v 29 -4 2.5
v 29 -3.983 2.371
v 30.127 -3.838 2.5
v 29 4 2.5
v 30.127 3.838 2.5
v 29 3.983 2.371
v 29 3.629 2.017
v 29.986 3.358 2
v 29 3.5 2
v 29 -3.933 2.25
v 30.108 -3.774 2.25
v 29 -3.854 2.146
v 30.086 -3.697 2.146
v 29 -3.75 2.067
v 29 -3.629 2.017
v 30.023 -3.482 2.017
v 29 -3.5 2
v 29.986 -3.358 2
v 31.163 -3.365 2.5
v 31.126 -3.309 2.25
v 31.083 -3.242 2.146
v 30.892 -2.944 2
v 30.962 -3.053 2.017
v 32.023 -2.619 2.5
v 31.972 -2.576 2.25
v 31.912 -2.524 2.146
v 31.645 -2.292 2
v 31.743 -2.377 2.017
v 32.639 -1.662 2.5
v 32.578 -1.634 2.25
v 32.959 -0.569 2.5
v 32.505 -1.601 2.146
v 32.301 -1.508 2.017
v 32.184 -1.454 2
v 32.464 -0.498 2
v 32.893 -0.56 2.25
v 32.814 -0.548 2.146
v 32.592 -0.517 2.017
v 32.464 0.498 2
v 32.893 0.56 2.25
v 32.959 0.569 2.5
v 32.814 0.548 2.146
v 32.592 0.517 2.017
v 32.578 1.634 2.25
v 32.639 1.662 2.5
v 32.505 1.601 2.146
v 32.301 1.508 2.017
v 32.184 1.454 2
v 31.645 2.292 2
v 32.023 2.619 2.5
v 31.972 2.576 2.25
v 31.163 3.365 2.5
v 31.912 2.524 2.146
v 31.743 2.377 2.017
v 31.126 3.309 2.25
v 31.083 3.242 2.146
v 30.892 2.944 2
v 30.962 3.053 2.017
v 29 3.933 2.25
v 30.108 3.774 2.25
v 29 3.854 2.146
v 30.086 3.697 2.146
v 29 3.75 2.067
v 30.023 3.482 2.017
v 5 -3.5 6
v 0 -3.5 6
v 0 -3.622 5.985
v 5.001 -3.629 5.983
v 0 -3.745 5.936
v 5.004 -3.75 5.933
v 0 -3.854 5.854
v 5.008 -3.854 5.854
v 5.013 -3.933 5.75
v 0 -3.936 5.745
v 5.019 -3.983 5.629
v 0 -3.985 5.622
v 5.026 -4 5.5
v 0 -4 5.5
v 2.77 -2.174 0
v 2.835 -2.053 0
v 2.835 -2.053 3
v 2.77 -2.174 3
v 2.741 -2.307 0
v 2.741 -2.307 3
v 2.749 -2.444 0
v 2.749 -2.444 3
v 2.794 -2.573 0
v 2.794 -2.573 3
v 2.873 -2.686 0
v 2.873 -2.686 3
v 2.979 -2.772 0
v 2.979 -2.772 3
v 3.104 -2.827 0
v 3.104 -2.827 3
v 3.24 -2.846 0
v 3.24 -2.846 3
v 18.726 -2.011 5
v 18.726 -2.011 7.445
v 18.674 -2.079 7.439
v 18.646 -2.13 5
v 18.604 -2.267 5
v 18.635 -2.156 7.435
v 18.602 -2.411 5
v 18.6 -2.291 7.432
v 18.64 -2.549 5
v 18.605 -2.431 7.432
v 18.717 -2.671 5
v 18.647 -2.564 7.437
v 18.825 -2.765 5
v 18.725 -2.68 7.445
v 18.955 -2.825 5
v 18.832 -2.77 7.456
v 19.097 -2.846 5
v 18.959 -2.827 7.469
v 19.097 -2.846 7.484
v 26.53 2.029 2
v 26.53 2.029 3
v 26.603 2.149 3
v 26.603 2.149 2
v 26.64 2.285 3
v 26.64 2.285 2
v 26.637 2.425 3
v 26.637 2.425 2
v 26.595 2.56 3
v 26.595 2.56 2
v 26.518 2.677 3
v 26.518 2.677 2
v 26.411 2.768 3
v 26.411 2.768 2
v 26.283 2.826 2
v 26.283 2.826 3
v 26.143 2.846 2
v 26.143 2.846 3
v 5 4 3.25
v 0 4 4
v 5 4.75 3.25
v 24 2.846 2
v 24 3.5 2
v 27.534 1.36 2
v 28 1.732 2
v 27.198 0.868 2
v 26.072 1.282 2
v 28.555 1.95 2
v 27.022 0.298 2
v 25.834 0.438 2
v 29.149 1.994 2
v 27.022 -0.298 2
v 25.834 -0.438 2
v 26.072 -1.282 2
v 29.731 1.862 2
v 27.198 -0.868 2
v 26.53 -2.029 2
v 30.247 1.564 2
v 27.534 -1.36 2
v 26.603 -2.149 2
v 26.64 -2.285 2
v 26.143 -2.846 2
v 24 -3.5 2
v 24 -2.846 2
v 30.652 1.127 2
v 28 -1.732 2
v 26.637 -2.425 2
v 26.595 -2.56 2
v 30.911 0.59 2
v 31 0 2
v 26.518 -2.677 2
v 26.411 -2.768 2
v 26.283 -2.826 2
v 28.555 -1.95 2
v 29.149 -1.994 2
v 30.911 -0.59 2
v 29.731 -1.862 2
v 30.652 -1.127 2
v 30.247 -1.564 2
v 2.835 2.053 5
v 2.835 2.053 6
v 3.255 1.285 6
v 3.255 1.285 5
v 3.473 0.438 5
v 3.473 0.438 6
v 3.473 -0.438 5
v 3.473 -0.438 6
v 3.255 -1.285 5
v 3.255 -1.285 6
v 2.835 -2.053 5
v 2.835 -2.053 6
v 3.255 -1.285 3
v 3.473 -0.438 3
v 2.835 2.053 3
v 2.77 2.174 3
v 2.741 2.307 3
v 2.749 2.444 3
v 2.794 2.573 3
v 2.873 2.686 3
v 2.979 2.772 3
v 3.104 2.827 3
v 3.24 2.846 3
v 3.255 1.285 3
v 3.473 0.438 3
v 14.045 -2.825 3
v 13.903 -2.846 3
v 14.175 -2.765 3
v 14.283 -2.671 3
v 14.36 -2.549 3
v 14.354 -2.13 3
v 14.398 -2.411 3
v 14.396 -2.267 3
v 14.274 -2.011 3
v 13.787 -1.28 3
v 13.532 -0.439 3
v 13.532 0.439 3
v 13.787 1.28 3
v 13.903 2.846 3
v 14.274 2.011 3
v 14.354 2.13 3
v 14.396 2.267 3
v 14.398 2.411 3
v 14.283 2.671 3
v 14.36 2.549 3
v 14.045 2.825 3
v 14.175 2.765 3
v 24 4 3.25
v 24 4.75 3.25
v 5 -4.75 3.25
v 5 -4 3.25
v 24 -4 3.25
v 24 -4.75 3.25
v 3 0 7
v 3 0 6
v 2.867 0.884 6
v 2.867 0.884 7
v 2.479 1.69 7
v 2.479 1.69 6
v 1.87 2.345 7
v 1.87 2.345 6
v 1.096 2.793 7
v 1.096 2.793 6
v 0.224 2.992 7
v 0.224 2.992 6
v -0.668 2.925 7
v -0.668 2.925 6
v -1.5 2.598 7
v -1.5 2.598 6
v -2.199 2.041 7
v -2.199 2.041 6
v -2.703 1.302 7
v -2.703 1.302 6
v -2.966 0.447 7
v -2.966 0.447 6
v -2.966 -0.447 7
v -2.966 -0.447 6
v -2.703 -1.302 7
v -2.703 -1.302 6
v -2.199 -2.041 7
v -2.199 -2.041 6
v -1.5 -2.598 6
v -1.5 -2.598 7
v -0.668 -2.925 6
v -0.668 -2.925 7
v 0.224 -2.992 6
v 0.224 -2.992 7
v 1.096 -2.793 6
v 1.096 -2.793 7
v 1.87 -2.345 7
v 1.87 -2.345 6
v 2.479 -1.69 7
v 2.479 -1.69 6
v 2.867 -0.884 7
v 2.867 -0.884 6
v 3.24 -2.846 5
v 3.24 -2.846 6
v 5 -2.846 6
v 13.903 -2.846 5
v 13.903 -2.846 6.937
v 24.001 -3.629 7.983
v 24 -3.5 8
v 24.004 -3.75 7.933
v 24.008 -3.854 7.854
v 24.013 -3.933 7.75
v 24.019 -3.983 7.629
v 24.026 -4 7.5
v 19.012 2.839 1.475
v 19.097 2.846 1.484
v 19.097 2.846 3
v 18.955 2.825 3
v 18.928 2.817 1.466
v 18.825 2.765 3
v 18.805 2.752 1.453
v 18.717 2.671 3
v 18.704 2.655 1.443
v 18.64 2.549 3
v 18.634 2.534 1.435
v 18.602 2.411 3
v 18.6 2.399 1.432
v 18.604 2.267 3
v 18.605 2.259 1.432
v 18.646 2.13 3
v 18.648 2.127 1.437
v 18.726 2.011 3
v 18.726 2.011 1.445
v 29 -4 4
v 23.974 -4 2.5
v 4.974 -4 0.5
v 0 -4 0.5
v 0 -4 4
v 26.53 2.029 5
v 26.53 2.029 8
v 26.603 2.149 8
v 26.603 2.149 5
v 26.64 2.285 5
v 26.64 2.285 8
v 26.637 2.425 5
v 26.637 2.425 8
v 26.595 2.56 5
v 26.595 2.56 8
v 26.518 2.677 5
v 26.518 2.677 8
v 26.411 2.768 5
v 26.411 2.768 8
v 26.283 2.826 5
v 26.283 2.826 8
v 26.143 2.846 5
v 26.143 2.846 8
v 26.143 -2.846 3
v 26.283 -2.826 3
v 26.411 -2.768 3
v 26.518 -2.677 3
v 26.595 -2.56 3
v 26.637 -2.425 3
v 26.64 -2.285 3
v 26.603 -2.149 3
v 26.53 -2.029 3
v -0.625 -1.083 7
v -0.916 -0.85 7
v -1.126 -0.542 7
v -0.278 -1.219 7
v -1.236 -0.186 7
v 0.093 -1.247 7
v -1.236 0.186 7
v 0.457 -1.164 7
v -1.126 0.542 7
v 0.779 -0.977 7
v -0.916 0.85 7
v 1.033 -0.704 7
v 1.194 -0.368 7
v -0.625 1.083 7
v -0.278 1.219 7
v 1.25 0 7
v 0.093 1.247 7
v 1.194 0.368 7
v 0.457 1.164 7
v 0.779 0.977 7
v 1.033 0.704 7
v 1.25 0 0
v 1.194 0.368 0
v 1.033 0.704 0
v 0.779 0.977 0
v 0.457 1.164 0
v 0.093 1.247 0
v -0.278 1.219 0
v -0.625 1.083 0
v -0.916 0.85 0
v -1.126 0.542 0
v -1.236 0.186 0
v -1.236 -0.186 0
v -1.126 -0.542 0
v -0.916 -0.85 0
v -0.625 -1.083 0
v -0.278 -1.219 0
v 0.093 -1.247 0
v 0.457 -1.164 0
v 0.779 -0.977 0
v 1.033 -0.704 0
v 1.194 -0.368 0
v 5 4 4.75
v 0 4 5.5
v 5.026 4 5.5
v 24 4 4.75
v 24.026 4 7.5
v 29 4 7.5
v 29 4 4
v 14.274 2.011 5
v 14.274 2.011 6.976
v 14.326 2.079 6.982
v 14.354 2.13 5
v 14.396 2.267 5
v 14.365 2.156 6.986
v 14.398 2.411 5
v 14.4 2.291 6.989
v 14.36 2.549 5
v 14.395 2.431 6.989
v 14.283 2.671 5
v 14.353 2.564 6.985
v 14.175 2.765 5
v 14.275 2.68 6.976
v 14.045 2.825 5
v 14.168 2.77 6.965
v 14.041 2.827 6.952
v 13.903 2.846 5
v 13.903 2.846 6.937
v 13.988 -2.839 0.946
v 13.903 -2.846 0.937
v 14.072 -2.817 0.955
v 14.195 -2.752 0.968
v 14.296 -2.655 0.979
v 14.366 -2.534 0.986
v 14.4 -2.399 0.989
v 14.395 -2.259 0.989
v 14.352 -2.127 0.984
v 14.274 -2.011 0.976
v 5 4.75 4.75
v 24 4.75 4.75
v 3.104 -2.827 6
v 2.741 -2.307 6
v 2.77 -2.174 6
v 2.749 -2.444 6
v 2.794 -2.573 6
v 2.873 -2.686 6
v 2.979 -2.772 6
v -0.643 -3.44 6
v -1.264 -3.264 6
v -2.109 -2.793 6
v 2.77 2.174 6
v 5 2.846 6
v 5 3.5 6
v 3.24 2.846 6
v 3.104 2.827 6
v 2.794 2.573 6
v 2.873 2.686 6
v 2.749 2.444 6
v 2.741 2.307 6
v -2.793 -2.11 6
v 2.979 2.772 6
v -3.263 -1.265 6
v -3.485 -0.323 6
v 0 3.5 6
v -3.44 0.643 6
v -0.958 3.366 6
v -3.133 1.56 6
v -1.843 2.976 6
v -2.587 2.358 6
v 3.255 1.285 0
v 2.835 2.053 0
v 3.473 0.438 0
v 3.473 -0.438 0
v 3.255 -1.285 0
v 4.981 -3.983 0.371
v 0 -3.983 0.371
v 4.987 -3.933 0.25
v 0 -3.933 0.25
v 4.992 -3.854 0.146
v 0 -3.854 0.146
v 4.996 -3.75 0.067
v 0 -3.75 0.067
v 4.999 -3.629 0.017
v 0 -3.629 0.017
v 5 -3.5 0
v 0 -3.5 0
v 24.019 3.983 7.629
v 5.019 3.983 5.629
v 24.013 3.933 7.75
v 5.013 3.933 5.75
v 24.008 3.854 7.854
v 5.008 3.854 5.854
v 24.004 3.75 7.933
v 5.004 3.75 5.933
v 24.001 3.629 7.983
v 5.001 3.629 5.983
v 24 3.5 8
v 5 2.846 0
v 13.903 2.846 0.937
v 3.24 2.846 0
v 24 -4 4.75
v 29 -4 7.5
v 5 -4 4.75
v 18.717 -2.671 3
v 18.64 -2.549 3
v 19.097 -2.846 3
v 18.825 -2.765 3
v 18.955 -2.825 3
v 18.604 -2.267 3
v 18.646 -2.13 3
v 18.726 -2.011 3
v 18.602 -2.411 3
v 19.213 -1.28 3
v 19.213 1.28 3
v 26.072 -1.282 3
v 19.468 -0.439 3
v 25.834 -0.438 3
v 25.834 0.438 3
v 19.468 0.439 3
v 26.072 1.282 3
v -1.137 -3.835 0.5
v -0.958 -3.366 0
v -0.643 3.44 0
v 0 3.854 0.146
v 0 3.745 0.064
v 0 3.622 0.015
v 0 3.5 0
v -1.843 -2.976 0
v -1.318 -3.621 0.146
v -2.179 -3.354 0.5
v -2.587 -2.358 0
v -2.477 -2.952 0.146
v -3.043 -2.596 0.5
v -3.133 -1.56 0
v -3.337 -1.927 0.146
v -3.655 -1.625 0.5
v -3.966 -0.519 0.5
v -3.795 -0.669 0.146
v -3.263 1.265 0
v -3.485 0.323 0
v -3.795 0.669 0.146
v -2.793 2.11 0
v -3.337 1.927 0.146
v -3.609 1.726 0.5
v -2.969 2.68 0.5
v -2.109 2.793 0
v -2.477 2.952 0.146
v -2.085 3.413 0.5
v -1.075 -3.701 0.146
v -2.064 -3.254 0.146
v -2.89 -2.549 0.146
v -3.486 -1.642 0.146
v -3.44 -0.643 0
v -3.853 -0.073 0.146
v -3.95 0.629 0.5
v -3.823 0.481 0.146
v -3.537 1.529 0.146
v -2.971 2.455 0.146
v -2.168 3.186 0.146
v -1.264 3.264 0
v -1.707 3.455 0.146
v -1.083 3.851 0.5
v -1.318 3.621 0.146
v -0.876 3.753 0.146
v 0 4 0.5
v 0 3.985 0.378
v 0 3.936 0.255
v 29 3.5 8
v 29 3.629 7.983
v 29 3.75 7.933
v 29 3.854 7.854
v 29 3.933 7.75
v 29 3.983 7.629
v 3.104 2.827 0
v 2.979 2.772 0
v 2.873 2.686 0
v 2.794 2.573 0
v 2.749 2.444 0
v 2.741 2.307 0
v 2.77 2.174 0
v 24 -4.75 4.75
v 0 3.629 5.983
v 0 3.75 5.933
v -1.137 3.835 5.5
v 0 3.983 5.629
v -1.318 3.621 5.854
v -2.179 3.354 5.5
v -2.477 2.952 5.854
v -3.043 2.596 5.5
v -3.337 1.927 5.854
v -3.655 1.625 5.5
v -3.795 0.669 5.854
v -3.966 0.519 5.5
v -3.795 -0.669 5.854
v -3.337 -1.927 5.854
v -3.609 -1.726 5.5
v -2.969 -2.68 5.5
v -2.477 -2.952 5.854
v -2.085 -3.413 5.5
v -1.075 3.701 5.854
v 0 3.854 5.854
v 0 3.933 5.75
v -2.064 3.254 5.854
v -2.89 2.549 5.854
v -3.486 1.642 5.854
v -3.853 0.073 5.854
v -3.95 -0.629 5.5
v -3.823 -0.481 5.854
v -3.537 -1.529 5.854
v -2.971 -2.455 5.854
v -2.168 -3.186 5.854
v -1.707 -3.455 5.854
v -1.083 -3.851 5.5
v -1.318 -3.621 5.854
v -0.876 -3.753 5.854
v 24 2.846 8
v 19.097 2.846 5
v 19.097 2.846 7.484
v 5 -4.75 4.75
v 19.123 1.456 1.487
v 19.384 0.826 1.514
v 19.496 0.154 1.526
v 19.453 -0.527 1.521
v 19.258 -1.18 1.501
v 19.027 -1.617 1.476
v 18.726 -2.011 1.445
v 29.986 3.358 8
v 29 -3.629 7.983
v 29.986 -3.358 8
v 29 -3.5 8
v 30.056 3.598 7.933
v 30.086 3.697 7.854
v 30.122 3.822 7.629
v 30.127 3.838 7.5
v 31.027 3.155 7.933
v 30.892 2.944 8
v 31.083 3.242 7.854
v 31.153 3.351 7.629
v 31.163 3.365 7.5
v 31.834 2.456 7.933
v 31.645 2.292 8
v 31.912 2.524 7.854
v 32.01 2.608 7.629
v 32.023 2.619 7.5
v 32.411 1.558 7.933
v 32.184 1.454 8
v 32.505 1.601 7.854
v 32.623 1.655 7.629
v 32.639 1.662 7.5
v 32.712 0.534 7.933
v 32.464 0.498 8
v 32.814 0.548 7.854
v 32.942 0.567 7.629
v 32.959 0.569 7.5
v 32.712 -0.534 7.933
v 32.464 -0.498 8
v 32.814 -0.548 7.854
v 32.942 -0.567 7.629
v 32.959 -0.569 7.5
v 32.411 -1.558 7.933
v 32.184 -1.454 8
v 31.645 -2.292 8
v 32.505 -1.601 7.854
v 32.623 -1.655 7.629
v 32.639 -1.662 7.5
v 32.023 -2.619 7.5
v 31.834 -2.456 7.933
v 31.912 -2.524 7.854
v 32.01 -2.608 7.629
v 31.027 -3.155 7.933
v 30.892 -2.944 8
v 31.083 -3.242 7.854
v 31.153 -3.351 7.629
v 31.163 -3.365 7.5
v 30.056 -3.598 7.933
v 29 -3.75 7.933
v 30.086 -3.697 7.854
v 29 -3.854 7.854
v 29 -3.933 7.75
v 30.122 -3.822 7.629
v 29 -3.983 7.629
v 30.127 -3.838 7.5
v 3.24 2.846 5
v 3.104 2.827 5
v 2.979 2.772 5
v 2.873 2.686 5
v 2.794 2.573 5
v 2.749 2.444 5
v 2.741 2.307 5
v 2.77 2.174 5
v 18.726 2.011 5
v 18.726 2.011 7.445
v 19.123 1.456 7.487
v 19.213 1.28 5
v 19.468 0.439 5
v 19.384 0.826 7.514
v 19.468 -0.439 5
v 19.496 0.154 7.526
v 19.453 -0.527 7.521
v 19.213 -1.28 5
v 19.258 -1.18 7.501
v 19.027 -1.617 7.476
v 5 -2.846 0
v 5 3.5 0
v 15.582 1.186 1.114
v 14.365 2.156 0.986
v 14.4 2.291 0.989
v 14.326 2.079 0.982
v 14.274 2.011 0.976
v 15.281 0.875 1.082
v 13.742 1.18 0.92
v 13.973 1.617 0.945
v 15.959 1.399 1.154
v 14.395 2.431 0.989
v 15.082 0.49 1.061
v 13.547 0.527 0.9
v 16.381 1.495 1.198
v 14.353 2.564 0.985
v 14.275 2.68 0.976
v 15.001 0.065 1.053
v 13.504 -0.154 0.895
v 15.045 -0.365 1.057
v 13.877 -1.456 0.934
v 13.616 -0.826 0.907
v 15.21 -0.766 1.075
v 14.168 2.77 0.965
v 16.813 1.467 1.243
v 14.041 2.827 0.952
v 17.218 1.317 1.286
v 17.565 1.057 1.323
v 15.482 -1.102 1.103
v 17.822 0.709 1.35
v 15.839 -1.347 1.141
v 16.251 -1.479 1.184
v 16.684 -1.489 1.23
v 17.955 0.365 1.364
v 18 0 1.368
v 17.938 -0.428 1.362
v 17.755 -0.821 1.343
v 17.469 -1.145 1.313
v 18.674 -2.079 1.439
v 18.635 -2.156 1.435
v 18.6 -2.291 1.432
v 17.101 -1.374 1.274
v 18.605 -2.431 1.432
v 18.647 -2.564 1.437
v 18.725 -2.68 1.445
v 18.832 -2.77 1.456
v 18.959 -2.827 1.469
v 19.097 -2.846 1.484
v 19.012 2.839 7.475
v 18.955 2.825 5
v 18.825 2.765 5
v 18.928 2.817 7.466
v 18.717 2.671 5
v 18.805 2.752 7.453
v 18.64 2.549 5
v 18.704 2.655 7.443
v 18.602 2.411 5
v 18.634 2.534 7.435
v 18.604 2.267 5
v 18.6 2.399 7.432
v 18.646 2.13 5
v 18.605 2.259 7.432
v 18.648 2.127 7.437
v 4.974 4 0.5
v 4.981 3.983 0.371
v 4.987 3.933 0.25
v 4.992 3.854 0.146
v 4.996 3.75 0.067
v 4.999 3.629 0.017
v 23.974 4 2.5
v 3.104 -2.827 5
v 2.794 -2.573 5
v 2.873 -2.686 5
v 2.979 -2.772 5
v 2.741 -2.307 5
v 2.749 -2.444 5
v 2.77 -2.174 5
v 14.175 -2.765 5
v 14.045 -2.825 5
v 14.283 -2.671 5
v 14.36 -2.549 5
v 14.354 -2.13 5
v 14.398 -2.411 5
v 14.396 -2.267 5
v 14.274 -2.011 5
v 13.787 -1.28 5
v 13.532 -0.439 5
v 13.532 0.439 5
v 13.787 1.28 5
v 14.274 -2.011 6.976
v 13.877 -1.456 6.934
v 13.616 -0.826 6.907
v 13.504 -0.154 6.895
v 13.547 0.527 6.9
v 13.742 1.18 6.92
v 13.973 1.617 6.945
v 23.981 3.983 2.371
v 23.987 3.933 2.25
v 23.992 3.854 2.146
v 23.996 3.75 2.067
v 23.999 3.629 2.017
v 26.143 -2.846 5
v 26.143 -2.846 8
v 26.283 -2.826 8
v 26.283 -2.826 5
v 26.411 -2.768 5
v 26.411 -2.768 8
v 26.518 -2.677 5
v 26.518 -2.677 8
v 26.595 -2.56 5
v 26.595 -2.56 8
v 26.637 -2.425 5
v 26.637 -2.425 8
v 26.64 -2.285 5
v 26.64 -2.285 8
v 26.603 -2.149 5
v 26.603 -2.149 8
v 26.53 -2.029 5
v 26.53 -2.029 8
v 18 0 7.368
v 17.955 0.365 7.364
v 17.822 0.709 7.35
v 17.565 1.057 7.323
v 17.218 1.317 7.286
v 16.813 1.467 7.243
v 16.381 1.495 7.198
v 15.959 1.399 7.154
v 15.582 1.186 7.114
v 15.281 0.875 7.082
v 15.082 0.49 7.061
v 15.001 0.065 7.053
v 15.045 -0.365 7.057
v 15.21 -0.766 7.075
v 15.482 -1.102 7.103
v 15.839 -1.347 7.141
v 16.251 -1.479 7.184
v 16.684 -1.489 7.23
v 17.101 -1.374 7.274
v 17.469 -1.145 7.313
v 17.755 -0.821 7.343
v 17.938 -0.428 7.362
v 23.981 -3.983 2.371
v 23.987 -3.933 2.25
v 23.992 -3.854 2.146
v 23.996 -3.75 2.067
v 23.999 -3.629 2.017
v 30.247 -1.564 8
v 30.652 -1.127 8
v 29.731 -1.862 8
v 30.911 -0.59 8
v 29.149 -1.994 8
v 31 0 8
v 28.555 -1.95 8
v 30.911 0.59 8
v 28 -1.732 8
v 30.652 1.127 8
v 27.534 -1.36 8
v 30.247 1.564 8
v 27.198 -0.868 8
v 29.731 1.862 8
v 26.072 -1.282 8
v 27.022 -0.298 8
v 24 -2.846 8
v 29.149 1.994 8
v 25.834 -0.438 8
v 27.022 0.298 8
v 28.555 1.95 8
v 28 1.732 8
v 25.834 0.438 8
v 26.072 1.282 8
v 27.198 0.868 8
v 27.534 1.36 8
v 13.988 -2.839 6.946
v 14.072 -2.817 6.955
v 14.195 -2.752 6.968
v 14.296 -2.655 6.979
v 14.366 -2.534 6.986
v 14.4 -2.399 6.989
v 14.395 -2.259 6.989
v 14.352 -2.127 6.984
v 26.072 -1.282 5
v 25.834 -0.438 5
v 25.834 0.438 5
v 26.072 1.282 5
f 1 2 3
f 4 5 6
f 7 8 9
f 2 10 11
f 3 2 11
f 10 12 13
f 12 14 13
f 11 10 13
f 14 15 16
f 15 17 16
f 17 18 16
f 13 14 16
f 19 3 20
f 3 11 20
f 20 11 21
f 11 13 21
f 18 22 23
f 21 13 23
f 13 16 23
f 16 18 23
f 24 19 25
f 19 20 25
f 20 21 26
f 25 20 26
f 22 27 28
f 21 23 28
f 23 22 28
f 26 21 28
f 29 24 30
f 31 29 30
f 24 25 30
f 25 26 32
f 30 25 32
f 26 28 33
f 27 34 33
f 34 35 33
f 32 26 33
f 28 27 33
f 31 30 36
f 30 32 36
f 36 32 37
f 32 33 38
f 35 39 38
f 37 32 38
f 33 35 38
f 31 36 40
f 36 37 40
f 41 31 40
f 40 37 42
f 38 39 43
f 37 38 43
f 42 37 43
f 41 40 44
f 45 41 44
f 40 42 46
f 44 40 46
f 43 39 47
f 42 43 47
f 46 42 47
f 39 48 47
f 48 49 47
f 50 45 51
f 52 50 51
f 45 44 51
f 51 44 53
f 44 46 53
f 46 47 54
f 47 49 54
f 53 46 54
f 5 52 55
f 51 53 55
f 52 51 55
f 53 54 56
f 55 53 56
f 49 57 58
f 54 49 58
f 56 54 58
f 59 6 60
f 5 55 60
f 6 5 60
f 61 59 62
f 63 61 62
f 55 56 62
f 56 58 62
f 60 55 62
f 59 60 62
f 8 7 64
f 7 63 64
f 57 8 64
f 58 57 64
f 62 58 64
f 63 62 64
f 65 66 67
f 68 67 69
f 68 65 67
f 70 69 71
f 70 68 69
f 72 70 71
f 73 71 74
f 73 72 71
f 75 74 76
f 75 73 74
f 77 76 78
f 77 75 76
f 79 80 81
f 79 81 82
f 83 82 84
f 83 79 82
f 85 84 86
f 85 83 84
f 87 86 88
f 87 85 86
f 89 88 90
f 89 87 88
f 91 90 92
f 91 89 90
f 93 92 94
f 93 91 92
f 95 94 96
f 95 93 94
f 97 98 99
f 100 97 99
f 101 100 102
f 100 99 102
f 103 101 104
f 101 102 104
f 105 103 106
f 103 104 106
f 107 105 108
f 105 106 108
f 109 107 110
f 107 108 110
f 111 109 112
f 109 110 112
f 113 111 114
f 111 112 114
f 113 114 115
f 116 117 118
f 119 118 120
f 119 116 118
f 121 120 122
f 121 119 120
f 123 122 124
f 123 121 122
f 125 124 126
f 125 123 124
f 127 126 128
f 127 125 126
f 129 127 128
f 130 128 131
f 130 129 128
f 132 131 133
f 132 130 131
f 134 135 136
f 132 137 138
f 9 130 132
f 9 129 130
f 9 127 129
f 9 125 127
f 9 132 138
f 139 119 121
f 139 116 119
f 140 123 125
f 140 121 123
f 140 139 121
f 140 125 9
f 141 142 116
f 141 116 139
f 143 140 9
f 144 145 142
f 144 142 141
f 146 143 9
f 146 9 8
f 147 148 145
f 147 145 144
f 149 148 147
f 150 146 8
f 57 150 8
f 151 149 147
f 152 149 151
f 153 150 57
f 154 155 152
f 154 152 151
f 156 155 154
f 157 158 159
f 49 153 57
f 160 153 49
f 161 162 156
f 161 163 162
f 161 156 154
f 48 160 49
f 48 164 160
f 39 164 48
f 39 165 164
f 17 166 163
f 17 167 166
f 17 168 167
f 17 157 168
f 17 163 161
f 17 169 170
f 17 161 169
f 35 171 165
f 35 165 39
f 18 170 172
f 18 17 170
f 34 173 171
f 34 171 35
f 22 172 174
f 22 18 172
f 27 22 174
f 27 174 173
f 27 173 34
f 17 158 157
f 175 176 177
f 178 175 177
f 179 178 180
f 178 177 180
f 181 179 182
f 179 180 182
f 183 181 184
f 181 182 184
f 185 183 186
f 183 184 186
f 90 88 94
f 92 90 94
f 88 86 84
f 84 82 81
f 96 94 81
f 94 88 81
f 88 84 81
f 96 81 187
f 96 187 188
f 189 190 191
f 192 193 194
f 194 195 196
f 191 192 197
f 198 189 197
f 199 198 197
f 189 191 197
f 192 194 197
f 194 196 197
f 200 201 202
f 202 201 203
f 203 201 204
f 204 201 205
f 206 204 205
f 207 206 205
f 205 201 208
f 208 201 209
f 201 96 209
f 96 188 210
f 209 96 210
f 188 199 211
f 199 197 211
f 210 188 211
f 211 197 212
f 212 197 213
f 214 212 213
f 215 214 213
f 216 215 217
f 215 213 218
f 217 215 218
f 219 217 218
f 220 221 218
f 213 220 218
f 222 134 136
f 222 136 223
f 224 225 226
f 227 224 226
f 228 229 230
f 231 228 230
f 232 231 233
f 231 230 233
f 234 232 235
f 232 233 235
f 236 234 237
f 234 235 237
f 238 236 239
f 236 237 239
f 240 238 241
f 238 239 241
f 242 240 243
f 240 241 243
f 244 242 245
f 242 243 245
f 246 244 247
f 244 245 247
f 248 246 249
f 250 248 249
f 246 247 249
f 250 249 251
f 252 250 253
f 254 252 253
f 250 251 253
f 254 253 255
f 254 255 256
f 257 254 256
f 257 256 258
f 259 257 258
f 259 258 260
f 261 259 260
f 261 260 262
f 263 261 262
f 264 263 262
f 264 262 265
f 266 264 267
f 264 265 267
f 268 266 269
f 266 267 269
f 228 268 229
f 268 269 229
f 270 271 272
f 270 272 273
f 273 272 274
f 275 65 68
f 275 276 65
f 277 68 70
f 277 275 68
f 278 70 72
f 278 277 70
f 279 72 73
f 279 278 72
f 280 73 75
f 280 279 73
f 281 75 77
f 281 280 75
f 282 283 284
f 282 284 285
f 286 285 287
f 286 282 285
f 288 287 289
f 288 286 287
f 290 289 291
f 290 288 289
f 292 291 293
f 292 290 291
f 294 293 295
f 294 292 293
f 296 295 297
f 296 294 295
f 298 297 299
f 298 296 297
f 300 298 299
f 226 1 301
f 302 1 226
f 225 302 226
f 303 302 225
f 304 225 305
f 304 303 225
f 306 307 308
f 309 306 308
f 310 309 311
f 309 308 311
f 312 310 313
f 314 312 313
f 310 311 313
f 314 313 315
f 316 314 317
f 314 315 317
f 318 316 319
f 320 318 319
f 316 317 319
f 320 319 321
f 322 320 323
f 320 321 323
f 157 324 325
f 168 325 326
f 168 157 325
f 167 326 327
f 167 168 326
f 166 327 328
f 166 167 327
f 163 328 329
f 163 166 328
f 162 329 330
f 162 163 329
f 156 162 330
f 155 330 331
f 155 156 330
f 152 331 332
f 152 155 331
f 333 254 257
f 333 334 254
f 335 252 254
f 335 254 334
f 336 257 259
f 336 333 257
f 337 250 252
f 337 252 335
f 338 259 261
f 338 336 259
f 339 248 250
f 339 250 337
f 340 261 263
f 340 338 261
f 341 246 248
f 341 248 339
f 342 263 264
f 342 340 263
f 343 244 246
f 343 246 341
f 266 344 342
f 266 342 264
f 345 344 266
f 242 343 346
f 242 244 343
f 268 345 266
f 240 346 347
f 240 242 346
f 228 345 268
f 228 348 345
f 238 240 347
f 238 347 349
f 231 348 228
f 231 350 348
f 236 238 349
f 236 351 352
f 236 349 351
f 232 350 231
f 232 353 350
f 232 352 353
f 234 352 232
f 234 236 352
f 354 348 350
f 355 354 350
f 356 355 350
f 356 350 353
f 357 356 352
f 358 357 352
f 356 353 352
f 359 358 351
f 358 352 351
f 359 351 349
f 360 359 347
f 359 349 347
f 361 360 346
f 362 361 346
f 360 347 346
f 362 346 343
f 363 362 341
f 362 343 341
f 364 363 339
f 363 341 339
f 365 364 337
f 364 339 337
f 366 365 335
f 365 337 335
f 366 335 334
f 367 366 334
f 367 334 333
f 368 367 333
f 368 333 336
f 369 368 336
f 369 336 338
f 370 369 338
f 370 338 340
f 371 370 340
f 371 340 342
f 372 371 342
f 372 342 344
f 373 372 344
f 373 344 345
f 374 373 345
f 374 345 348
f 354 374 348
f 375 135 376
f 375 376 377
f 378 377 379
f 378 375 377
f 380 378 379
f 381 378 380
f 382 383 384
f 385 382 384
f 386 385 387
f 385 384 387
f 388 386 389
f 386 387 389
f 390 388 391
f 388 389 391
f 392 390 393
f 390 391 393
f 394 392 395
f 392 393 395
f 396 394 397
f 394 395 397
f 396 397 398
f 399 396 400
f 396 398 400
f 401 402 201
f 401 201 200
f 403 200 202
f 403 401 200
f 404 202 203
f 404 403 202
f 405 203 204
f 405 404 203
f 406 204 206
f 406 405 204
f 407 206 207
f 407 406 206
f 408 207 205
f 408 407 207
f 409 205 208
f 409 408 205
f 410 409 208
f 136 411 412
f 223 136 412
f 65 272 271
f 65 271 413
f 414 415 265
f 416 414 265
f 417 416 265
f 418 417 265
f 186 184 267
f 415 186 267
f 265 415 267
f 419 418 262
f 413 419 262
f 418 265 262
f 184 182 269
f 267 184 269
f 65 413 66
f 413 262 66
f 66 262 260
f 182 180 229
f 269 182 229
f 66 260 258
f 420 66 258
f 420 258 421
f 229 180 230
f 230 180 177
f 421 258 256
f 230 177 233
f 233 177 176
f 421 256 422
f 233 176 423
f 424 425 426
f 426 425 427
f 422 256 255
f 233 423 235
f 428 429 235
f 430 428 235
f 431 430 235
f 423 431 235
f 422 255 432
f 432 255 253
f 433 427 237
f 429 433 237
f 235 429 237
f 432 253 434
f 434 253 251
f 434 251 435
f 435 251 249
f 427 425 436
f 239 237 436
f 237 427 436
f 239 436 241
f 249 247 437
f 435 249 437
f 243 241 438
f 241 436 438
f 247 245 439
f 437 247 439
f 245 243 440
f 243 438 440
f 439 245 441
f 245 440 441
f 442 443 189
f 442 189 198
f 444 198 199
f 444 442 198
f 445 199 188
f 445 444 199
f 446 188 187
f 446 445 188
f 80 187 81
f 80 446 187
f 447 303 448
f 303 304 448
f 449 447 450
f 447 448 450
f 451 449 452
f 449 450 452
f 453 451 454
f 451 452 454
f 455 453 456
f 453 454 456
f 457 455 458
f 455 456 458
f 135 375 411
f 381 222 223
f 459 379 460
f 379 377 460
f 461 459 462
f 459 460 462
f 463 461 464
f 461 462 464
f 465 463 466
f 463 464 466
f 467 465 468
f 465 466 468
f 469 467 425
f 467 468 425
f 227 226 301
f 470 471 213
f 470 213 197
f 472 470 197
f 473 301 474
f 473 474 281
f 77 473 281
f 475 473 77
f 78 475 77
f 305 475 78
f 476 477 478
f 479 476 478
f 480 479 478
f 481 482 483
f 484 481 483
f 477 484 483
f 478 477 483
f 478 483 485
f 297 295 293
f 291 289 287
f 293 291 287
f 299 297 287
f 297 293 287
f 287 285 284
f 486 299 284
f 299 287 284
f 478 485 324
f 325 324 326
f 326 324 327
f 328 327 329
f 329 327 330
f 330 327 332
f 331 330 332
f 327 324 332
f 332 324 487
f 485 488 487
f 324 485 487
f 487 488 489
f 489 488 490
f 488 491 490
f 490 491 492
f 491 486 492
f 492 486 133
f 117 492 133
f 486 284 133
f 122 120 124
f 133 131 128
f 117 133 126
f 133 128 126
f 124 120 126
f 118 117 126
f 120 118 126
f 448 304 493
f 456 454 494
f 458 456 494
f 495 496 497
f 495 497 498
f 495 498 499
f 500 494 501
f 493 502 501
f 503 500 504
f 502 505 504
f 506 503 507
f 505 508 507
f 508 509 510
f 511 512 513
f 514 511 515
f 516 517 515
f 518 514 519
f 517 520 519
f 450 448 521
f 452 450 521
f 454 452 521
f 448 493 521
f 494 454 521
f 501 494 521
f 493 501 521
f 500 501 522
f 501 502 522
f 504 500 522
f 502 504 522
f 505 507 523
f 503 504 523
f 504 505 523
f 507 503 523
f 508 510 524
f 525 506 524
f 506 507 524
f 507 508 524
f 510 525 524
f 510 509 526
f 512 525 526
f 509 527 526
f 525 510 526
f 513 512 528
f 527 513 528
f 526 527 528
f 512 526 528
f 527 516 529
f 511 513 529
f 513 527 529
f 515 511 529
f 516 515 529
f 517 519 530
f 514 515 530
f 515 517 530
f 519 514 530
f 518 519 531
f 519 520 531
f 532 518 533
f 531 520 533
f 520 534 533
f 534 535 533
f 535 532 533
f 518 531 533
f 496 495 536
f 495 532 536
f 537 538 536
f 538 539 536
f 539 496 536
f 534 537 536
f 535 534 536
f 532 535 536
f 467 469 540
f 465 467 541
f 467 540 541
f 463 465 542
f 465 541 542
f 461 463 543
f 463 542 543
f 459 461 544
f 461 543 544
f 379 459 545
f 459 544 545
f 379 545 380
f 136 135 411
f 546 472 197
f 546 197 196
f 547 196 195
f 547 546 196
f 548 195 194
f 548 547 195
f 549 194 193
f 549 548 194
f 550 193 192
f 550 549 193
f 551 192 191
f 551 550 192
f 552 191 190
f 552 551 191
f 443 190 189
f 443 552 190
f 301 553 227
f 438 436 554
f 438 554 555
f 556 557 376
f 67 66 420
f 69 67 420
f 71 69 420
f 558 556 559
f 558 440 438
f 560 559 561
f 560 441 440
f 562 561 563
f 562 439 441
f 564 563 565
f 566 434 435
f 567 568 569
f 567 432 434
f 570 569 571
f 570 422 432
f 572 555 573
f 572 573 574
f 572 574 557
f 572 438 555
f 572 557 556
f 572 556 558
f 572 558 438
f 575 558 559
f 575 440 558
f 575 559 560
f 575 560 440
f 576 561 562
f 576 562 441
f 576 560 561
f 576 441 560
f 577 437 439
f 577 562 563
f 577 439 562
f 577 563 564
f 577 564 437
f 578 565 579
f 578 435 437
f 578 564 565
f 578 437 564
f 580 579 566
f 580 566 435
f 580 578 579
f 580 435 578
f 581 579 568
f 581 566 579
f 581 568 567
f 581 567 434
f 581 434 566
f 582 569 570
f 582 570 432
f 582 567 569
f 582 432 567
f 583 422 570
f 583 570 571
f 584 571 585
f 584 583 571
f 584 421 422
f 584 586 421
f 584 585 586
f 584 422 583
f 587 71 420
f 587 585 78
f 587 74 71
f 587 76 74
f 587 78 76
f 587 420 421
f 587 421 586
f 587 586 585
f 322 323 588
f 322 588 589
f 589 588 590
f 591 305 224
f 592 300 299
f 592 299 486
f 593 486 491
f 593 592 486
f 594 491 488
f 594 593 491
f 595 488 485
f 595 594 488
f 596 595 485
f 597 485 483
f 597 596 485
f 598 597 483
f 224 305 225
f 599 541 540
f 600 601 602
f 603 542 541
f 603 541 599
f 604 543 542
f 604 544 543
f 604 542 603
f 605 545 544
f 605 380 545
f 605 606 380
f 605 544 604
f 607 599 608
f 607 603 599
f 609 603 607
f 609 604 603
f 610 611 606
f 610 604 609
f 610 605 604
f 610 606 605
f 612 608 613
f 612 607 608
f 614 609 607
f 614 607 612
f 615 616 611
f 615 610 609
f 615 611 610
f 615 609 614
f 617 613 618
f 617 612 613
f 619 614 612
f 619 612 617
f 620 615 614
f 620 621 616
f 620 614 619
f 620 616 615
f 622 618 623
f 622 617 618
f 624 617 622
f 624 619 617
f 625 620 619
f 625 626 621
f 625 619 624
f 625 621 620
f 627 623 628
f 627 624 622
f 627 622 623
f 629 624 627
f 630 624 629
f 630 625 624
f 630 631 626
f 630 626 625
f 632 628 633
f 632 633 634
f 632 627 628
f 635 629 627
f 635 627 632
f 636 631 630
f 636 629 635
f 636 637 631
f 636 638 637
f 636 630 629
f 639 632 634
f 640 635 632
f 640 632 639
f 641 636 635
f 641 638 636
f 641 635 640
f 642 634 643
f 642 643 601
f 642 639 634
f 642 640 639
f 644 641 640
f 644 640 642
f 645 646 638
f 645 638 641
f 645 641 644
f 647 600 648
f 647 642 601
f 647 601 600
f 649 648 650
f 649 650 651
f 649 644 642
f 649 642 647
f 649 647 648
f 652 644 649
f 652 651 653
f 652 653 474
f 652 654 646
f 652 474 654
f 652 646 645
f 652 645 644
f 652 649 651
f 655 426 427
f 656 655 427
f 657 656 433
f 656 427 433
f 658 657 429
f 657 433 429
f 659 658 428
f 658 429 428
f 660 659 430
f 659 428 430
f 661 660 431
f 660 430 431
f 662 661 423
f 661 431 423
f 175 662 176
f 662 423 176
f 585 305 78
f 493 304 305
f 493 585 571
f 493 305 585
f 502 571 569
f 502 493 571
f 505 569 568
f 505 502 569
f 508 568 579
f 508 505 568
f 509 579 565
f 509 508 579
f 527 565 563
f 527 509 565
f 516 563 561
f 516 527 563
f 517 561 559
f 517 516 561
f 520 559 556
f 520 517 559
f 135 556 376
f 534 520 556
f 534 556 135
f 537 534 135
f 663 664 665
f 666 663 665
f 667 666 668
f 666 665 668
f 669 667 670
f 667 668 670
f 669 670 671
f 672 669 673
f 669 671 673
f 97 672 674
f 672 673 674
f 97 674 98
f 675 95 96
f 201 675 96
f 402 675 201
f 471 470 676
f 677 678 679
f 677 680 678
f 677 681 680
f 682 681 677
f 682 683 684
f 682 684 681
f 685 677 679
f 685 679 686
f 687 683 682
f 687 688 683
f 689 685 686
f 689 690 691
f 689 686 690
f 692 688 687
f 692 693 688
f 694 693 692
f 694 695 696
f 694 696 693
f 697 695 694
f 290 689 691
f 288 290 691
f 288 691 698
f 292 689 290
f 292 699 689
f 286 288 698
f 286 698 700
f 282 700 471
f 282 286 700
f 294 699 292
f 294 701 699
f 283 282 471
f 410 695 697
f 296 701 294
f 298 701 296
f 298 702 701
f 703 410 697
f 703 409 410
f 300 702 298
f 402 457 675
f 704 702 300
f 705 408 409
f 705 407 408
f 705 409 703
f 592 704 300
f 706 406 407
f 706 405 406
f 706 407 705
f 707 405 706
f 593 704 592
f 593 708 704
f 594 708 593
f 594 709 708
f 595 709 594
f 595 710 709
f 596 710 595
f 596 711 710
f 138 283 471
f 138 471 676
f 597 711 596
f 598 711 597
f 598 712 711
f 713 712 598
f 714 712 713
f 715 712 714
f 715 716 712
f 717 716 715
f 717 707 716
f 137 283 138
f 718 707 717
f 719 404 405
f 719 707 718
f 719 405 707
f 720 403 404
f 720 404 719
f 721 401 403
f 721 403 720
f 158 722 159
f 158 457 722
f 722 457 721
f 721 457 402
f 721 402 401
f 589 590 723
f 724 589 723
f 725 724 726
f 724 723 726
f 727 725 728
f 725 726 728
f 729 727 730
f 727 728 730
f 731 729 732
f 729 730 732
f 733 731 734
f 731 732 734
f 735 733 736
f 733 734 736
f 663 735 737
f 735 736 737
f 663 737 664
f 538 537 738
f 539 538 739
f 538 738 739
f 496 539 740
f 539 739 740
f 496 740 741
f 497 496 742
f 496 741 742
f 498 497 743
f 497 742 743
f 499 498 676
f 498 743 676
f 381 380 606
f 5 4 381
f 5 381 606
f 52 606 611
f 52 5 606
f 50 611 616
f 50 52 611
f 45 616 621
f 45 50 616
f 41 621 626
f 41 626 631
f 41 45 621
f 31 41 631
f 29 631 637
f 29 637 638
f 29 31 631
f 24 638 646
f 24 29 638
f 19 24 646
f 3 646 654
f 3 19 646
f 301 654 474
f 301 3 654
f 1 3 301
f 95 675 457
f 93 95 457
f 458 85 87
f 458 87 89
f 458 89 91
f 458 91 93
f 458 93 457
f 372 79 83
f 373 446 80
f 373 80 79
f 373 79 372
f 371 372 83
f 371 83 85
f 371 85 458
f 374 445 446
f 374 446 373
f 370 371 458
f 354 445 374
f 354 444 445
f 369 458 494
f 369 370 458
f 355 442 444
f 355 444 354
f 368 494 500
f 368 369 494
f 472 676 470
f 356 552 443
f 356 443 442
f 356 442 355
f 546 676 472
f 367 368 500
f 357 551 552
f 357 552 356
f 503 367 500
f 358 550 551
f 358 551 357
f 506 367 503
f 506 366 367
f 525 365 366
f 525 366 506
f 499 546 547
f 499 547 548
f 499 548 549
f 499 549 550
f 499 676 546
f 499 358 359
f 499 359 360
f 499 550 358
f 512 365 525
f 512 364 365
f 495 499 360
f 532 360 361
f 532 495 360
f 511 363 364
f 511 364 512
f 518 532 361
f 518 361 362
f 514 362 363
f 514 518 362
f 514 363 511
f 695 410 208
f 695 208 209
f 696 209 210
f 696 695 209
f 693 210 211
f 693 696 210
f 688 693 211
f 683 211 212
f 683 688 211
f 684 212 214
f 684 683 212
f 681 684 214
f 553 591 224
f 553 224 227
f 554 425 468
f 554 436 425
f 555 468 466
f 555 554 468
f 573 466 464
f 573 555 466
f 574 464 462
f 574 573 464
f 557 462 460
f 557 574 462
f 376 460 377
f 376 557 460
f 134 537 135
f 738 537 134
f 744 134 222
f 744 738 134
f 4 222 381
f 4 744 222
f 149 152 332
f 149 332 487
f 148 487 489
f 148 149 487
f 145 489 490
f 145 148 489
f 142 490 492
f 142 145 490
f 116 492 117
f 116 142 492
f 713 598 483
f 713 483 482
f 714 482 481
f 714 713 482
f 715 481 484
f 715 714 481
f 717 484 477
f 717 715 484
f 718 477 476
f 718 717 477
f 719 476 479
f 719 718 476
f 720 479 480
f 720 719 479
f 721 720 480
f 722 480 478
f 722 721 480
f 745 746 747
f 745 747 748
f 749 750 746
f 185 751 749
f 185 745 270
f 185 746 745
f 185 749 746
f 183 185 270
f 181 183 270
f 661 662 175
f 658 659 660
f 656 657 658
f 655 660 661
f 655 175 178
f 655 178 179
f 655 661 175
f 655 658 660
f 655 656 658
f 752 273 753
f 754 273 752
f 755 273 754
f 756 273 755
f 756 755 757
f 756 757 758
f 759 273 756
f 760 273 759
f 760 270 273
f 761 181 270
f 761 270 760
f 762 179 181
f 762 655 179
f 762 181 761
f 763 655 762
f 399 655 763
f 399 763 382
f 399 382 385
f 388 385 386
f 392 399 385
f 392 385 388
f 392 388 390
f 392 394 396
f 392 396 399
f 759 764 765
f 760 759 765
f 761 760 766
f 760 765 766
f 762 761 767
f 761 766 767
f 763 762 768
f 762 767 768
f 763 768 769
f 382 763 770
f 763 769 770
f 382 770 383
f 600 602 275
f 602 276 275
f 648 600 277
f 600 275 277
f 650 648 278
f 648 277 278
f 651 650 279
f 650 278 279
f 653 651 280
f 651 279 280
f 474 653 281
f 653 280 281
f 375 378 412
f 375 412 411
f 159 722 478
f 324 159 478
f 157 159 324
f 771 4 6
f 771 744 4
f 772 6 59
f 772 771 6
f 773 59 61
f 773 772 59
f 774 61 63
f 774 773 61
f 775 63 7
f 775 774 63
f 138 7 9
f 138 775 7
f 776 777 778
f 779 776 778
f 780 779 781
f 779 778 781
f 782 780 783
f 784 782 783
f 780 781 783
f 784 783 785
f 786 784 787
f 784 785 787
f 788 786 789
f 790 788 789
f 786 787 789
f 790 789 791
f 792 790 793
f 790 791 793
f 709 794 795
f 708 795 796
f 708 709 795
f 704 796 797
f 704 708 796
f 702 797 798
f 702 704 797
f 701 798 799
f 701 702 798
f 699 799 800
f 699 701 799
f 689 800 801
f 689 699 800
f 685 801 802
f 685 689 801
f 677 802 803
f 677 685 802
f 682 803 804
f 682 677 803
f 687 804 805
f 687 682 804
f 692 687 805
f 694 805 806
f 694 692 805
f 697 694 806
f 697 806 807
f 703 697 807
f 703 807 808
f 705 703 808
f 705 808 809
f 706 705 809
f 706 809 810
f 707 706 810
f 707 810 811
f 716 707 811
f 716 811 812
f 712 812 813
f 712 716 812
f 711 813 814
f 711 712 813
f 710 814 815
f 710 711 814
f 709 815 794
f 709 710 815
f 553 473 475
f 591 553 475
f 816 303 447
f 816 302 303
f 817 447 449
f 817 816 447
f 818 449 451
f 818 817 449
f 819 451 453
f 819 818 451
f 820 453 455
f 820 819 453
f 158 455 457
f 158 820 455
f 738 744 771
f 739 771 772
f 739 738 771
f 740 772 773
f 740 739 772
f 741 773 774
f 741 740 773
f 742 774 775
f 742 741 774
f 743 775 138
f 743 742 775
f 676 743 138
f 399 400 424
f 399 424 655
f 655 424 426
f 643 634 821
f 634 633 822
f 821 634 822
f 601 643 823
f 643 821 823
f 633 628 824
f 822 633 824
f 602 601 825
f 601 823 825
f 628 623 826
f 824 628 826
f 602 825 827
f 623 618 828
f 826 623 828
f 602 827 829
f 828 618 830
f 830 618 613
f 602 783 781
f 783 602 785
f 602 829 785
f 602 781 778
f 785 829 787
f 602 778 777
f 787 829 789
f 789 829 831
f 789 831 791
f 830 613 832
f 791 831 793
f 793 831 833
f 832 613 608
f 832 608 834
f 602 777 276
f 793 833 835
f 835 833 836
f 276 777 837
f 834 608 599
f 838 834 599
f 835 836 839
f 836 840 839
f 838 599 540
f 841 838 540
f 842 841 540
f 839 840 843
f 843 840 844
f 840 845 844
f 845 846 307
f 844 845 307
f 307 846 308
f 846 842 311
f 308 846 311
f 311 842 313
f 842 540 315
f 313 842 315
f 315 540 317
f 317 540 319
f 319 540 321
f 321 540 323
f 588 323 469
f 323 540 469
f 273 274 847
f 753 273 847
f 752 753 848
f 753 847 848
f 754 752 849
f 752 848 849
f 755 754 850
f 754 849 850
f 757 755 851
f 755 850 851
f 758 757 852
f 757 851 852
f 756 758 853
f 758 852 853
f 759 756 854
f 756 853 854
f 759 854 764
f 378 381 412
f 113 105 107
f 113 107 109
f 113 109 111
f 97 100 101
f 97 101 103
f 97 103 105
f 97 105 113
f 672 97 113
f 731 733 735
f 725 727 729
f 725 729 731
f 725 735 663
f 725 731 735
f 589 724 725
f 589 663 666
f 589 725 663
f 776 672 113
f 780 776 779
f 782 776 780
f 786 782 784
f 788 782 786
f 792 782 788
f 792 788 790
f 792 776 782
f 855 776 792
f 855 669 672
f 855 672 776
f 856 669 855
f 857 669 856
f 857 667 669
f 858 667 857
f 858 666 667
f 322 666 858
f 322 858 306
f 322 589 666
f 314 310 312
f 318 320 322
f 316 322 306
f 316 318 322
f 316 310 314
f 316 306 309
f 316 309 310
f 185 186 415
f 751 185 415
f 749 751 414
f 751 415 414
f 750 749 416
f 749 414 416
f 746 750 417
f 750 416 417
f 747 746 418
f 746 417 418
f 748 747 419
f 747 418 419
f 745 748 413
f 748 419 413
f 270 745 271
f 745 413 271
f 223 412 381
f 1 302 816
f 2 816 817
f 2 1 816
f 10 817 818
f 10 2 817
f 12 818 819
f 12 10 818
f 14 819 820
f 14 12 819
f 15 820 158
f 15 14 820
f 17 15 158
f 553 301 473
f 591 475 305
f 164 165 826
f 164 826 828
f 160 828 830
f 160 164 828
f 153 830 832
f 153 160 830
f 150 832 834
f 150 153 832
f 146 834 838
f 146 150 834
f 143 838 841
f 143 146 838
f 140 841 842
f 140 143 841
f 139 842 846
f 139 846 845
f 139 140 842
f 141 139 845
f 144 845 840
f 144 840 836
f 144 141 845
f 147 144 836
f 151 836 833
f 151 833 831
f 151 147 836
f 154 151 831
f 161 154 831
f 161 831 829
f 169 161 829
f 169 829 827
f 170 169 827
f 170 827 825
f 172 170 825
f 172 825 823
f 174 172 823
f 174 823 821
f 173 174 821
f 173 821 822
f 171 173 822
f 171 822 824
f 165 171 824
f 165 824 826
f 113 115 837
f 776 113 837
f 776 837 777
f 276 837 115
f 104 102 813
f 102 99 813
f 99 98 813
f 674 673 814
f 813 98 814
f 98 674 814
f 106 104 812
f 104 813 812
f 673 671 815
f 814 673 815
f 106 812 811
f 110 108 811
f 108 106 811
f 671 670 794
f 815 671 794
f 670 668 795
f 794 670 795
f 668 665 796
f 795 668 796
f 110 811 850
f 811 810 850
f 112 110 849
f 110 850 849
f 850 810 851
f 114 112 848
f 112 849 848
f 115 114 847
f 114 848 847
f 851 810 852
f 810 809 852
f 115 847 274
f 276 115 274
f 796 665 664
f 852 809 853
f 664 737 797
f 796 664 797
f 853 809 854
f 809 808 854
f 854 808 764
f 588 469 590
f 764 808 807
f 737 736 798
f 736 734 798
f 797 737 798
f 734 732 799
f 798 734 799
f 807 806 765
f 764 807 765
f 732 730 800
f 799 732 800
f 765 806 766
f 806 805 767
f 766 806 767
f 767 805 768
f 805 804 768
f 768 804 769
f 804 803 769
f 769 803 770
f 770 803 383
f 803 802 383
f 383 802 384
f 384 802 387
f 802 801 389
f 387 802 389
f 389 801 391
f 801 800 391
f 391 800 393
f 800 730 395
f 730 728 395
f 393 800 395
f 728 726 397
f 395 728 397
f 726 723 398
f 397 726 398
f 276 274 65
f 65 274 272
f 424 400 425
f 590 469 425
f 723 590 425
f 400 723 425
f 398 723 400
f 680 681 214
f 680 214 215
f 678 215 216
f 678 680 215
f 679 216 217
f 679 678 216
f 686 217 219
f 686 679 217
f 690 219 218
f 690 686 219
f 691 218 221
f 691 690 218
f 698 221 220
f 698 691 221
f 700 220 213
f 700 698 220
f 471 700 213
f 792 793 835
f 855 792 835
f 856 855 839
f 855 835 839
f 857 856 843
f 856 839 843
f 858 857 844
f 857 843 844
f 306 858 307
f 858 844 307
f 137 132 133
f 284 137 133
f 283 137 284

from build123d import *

# Parameters (mm, degrees)
ESQUISSE1_R             = 2
ESQUISSE1_R_2           = 1.5
BASE_EXTRUSION_DEPTH    = 8
ENL_V_MAT_EXTRU_1_DEPTH = 24
ENL_V_MAT_EXTRU_2_DEPTH = 3
BOSS_EXTRU_2_DEPTH      = 0.75
ENL_V_MAT_EXTRU_3_DEPTH = 5.75
CONG_1_R                = 0.5
ESQUISSE9_R             = 3
BOSS_EXTRU_3_DEPTH      = 1
ESQUISSE10_R            = 1.25
ENL_V_MAT_EXTRU_4_DEPTH = 8


with BuildPart() as part:
    # Esquisse1 → Base-Extrusion (new body)
    with BuildSketch(Plane.XY):
        with BuildLine():
            Line((0, 4), (29, 4))
            ThreePointArc((29, 4), (33, 0), (29, -4))
            Line((29, -4), (0, -4))
            ThreePointArc((0, -4), (-4, 0), (0, 4))
        make_face()
        with Locations((29, 0)):
            Circle(ESQUISSE1_R, mode=Mode.SUBTRACT)
        with Locations((16.5, 0)):
            Circle(ESQUISSE1_R_2, mode=Mode.SUBTRACT)
    extrude(amount=BASE_EXTRUSION_DEPTH)

    # Esquisse2 → Enlèv. mat.-Extru.1 (cut, symmetric)
    with BuildSketch(Plane(origin=(0, 0, 0), x_dir=(1, 0, 0), z_dir=(0, 1, 0))):
        Polygon((-4, 0), (5, 0), (24, -2), (32, -2), (34, -2), (34, 2), (-5, 2), (-5, 0), align=None)
        Polygon((30, -8), (24, -8), (5, -6), (-5, -6), (-5, -9), (35, -9), (35, -8), align=None)
    extrude(amount=ENL_V_MAT_EXTRU_1_DEPTH, both=True, mode=Mode.SUBTRACT)

    # Esquisse3 → Enlèv. mat.-Extru.2 (cut)
    with BuildSketch(Plane.XY.offset(8)):
        with BuildLine():
            Line((26.143442915, 2.846006946), (19.097354695, 2.846006946))
            ThreePointArc((19.097354695, 2.846006946), (18.640423669, 2.549019353), (18.726304024, 2.010863096))
            ThreePointArc((18.726304024, 2.010863096), (19.5, 0), (18.726304024, -2.010863096))
            ThreePointArc((18.726304024, -2.010863096), (18.640423669, -2.549019353), (19.097354695, -2.846006946))
            Line((19.097354695, -2.846006946), (26.143442915, -2.846006946))
            ThreePointArc((26.143442915, -2.846006946), (26.595475356, -2.559704564), (26.529835939, -2.028673634))
            ThreePointArc((26.529835939, -2.028673634), (25.80356023, 0), (26.529835939, 2.028673634))
            ThreePointArc((26.529835939, 2.028673634), (26.595475356, 2.559704564), (26.143442915, 2.846006946))
        make_face()
        with BuildLine():
            Line((13.902645305, 2.846006946), (3.239791878, 2.846006946))
            ThreePointArc((3.239791878, 2.846006946), (2.794468717, 2.573355319), (2.834817893, 2.052756078))
            ThreePointArc((2.834817893, 2.052756078), (3.5, 0), (2.834817893, -2.052756078))
            ThreePointArc((2.834817893, -2.052756078), (2.794468717, -2.573355319), (3.239791878, -2.846006946))
            Line((3.239791878, -2.846006946), (13.902645305, -2.846006946))
            ThreePointArc((13.902645305, -2.846006946), (14.359576331, -2.549019353), (14.273695976, -2.010863096))
            ThreePointArc((14.273695976, -2.010863096), (13.5, 0), (14.273695976, 2.010863096))
            ThreePointArc((14.273695976, 2.010863096), (14.359576331, 2.549019353), (13.902645305, 2.846006946))
        make_face()
    enl_v_mat_extru_2 = extrude(amount=-ENL_V_MAT_EXTRU_2_DEPTH, mode=Mode.SUBTRACT)

    # Symétrie1: Enlèv. mat.-Extru.2 across plane
    add(enl_v_mat_extru_2.mirror(Plane(origin=(0, 0, 4), x_dir=(1, 0, 0), z_dir=(0, 0, -1))), mode=Mode.SUBTRACT)

    # Esquisse7 → Boss.-Extru.2 (add)
    with BuildSketch(Plane.XZ.offset(4)):
        Polygon((5, 3.25), (24, 3.25), (29, 4), (24, 4.75), (5, 4.75), (0, 4), align=None)
    boss_extru_2 = extrude(amount=BOSS_EXTRU_2_DEPTH)

    # Symétrie2: Boss.-Extru.2 across plane
    add(boss_extru_2.mirror(Plane.ZX))

    # Esquisse8 → Enlèv. mat.-Extru.3 (cut, through all)
    with BuildSketch(Plane.XY.offset(4.75)):
        Polygon((0, 4), (5, 4.75), (5, 7), (0, 7), align=None)
        Polygon((24, 4.75), (29, 4), (29, 7), (24, 7), align=None)
        Polygon((29, -7), (24, -7), (24, -4.75), (29, -4), align=None)
        Polygon((5, -4.75), (5, -7), (0, -7), (0, -4), align=None)
    extrude(amount=-ENL_V_MAT_EXTRU_3_DEPTH, mode=Mode.SUBTRACT)

    # Congé1
    cong_1_edges = [part.edges().sort_by_distance(p)[0] for p in [
        (26.5, -4, 2),
        (14.5, -4, 1),
        (2.5, -4, 0),
        (33, 0, 2),
        (33, 0, 8),
        (26.5, -4, 8),
        (14.5, -4, 7),
        (2.5, -4, 6),
        (2.5, 4, 6),
        (-4, 0, 6),
        (14.5, 4, 7),
        (26.5, 4, 8),
        (2.5, 4, 0),
        (14.5, 4, 1),
        (26.5, 4, 2),
        (-4, 0, 0),
    ]]
    fillet(cong_1_edges, radius=CONG_1_R)

    # Esquisse9 → Boss.-Extru.3 (add)
    with BuildSketch(Plane.XY.offset(6)):
        Circle(ESQUISSE9_R)
    extrude(amount=BOSS_EXTRU_3_DEPTH)

    # Esquisse10 → Enlèv. mat.-Extru.4 (cut, through all)
    with BuildSketch(Plane.XY.offset(7)):
        Circle(ESQUISSE10_R)
    extrude(amount=-ENL_V_MAT_EXTRU_4_DEPTH, mode=Mode.SUBTRACT)


solid = part.part
